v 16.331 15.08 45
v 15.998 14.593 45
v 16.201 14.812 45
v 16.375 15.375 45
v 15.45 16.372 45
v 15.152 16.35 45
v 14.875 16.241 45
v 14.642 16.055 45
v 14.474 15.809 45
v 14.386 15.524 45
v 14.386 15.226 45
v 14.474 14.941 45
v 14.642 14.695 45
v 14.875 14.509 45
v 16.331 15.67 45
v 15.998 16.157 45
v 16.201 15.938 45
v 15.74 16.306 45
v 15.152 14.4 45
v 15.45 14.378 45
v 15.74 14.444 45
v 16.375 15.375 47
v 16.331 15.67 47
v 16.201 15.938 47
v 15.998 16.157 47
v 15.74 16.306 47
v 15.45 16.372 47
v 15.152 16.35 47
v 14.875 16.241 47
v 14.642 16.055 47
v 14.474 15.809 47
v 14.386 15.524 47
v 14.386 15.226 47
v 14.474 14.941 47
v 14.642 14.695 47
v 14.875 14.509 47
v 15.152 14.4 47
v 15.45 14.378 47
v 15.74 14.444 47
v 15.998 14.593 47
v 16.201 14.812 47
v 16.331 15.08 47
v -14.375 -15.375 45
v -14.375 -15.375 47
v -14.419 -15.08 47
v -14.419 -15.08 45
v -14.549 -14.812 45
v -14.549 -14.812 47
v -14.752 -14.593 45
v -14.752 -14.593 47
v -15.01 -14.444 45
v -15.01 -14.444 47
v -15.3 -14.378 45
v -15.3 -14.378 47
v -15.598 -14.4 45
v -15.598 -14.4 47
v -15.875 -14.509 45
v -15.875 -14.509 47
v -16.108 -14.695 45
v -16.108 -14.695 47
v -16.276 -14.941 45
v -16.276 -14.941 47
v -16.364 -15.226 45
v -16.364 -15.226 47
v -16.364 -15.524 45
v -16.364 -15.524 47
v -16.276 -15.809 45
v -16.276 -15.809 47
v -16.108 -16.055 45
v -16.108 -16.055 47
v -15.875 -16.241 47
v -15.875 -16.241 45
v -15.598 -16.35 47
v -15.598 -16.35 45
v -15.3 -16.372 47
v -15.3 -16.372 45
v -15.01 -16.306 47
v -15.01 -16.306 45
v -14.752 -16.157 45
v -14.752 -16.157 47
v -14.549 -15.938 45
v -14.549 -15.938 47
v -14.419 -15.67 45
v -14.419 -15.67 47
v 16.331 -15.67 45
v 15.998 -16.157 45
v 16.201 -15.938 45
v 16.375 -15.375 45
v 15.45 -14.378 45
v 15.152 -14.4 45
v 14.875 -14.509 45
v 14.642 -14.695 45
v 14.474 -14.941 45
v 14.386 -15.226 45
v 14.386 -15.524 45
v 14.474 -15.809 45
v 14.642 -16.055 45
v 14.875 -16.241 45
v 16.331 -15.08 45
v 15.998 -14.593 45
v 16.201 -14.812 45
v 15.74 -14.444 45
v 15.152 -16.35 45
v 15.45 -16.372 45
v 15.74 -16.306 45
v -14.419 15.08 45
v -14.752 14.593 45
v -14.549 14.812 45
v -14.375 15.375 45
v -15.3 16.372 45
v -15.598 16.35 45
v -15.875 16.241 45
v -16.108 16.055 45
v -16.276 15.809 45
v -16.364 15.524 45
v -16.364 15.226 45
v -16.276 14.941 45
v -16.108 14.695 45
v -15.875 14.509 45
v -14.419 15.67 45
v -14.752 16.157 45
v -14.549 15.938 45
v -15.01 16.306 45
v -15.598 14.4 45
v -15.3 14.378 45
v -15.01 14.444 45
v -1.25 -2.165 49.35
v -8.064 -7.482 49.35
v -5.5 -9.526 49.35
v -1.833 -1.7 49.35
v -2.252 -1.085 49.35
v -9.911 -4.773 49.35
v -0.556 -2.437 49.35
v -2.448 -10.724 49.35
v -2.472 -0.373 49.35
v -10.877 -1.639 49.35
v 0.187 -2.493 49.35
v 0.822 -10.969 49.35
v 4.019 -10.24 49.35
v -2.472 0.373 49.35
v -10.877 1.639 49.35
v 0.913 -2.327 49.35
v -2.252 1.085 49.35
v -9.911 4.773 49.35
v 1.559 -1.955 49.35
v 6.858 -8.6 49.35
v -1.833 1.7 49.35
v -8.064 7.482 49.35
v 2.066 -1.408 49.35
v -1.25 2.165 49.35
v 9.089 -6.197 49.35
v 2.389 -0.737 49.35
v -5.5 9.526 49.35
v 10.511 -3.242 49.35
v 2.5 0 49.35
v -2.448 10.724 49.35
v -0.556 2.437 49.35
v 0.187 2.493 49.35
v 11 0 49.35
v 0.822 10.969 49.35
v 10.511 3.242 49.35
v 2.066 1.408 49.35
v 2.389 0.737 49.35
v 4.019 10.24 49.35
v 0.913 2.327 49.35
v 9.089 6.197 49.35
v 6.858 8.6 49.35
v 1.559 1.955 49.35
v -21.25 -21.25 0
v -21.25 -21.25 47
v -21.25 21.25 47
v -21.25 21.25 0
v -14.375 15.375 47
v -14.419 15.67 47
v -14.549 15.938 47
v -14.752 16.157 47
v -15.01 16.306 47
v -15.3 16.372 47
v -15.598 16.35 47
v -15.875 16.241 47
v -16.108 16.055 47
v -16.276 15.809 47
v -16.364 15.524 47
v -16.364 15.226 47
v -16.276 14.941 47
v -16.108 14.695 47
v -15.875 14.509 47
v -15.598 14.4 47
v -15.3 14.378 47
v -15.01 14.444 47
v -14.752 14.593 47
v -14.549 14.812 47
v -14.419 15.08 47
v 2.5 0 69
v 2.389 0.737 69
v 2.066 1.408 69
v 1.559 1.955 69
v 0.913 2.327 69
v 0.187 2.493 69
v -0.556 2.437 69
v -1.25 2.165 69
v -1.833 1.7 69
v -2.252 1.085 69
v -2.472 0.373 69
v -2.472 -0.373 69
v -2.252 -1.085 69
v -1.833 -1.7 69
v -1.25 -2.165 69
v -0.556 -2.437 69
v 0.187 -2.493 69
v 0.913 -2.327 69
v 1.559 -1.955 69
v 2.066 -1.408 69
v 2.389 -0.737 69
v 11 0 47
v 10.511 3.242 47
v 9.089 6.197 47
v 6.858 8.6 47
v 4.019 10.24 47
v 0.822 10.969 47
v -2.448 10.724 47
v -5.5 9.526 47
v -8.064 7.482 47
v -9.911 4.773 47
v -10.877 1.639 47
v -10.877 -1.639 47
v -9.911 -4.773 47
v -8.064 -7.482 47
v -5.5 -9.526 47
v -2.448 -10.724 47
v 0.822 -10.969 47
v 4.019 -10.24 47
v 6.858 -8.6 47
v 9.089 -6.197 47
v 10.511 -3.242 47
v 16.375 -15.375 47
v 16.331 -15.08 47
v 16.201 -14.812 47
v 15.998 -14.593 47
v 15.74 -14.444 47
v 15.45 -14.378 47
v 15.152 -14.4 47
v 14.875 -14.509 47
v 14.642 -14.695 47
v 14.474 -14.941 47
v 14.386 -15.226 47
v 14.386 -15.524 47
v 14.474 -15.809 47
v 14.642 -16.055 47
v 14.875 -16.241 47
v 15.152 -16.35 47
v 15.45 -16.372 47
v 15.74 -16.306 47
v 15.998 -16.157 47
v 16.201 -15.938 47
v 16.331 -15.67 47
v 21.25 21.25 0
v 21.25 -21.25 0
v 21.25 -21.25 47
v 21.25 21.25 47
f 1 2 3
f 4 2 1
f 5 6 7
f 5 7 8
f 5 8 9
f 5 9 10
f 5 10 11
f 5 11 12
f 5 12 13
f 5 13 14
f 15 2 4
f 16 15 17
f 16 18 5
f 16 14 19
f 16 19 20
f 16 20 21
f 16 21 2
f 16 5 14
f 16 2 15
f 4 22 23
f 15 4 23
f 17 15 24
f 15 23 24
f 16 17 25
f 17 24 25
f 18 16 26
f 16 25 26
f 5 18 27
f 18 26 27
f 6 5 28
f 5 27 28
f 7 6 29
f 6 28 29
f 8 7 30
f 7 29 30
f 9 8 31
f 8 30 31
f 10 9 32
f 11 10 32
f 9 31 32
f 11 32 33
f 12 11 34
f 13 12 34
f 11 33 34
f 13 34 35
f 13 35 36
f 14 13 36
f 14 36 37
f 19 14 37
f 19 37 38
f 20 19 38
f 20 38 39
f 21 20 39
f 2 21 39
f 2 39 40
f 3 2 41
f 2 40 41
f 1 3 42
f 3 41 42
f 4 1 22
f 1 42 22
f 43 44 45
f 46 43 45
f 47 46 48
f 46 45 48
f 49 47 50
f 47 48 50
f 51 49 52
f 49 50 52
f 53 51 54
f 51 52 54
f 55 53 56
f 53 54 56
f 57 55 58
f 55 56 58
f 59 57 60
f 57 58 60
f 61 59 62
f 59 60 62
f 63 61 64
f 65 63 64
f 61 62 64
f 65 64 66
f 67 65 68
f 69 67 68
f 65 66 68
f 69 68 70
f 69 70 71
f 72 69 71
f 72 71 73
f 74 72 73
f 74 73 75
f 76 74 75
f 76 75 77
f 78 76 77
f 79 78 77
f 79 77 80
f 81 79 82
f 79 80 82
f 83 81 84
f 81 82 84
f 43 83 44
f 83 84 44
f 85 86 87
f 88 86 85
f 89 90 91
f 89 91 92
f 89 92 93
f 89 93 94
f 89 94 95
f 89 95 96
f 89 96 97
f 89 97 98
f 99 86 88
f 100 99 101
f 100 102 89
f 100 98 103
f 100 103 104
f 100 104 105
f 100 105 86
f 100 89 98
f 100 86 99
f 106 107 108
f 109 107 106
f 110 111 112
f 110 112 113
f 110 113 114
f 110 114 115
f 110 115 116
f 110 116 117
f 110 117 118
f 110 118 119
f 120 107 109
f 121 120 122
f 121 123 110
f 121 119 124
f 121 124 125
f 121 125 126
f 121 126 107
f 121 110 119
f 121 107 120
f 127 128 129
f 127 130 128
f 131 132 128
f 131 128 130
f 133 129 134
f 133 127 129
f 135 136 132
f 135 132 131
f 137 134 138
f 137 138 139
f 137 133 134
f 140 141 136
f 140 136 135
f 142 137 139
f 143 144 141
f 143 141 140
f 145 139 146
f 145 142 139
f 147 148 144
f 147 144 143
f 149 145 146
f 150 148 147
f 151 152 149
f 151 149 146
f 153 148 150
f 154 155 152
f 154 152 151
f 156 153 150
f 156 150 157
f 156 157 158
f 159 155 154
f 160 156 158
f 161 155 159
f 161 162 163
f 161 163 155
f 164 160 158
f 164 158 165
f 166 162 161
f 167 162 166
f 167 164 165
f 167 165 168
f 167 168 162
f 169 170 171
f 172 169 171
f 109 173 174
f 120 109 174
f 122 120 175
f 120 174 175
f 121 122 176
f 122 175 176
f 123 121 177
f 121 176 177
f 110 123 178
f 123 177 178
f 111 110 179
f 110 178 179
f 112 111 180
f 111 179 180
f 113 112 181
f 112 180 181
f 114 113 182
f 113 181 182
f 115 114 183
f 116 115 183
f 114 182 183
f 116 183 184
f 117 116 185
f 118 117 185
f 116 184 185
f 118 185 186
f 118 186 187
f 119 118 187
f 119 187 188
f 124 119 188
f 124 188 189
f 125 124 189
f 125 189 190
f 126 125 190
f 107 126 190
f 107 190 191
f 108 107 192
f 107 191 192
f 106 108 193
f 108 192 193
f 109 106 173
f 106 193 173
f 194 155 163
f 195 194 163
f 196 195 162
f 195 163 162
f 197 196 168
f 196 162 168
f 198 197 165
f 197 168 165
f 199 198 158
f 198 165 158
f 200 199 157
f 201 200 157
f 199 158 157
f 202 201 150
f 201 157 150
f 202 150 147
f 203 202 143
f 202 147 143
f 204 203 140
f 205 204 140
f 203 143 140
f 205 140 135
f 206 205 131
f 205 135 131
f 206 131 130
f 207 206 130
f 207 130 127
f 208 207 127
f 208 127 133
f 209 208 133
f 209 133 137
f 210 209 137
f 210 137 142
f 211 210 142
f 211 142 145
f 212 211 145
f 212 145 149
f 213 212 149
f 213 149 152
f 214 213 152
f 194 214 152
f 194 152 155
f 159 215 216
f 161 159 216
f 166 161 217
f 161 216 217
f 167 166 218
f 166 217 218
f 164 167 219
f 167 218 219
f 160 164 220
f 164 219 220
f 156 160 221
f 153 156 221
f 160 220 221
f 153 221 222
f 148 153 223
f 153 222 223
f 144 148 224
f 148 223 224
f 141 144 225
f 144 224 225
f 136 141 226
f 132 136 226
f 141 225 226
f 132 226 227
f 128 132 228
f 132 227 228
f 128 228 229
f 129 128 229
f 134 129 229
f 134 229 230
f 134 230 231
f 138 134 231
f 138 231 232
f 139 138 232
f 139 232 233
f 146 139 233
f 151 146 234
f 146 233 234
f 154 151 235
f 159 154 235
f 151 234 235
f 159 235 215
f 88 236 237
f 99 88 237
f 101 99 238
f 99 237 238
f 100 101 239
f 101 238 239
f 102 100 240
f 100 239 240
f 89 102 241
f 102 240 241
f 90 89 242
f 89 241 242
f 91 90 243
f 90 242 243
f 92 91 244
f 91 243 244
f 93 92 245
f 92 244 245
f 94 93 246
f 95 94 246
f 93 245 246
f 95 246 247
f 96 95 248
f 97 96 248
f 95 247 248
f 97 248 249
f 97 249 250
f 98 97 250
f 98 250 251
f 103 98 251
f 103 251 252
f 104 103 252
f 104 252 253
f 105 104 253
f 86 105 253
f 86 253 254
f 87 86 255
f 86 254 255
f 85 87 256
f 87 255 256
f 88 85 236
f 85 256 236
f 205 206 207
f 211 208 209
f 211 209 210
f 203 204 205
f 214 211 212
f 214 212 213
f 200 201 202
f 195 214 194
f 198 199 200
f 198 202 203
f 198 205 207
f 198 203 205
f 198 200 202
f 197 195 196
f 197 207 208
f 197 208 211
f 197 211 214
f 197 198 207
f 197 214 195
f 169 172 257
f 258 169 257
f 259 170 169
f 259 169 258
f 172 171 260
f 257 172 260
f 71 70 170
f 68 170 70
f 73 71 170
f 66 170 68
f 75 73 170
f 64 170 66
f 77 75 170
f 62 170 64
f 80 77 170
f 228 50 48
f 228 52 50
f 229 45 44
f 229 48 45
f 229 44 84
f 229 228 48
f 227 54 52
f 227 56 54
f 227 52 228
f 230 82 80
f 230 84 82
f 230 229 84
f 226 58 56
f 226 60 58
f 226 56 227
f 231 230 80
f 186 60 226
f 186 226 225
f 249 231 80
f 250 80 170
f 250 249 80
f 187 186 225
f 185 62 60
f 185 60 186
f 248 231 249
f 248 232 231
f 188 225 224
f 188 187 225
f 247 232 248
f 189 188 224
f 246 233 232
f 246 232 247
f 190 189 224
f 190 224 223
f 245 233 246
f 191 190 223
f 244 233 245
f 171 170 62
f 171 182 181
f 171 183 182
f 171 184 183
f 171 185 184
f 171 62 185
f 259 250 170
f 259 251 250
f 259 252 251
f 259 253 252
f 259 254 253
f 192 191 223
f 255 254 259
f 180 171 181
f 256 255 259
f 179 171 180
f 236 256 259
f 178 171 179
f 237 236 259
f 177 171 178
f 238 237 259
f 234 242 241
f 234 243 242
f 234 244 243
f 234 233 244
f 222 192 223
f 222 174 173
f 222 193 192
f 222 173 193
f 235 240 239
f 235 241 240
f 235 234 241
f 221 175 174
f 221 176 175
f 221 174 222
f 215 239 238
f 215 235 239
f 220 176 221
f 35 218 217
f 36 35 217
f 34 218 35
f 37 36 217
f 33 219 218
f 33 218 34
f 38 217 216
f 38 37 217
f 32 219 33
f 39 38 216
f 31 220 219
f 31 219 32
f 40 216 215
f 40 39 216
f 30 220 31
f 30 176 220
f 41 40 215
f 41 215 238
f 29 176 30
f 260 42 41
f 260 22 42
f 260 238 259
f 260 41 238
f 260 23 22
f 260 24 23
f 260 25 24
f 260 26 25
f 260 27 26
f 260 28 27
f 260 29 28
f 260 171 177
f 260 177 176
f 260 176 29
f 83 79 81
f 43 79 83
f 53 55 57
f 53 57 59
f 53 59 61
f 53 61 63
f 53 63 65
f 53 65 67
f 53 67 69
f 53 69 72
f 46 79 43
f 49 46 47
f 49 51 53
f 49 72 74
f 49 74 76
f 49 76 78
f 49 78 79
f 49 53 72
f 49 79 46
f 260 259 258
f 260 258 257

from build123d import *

# Parameters (mm, degrees)
SKETCH1_W           = 42.5
SKETCH1_H           = 42.5
BOSS_EXTRUDE1_DEPTH = 47
SKETCH2_R           = 1
CUT_EXTRUDE1_DEPTH  = 2
SKETCH3_R           = 2.5
BOSS_EXTRUDE2_DEPTH = 22
SKETCH4_R           = 11
BOSS_EXTRUDE3_DEPTH = 2.35


with BuildPart() as part:
    # Sketch1 → Boss-Extrude1 (new body)
    with BuildSketch(Plane.XY):
        Rectangle(SKETCH1_W, SKETCH1_H)
    extrude(amount=BOSS_EXTRUDE1_DEPTH)

    # Sketch2 → Cut-Extrude1 (cut)
    with BuildSketch(Plane.XY.offset(47)):
        with Locations((-15.375, 15.375)):
            Circle(SKETCH2_R)
        with Locations((15.375, 15.375)):
            Circle(SKETCH2_R)
        with Locations((15.375, -15.375)):
            Circle(SKETCH2_R)
        with Locations((-15.375, -15.375)):
            Circle(SKETCH2_R)
    extrude(amount=-CUT_EXTRUDE1_DEPTH, mode=Mode.SUBTRACT)

    # Sketch3 → Boss-Extrude2 (add)
    with BuildSketch(Plane.XY.offset(47)):
        Circle(SKETCH3_R)
    extrude(amount=BOSS_EXTRUDE2_DEPTH)

    # Sketch4 → Boss-Extrude3 (add)
    with BuildSketch(Plane.XY.offset(47)):
        Circle(SKETCH4_R)
    extrude(amount=BOSS_EXTRUDE3_DEPTH)


solid = part.part
